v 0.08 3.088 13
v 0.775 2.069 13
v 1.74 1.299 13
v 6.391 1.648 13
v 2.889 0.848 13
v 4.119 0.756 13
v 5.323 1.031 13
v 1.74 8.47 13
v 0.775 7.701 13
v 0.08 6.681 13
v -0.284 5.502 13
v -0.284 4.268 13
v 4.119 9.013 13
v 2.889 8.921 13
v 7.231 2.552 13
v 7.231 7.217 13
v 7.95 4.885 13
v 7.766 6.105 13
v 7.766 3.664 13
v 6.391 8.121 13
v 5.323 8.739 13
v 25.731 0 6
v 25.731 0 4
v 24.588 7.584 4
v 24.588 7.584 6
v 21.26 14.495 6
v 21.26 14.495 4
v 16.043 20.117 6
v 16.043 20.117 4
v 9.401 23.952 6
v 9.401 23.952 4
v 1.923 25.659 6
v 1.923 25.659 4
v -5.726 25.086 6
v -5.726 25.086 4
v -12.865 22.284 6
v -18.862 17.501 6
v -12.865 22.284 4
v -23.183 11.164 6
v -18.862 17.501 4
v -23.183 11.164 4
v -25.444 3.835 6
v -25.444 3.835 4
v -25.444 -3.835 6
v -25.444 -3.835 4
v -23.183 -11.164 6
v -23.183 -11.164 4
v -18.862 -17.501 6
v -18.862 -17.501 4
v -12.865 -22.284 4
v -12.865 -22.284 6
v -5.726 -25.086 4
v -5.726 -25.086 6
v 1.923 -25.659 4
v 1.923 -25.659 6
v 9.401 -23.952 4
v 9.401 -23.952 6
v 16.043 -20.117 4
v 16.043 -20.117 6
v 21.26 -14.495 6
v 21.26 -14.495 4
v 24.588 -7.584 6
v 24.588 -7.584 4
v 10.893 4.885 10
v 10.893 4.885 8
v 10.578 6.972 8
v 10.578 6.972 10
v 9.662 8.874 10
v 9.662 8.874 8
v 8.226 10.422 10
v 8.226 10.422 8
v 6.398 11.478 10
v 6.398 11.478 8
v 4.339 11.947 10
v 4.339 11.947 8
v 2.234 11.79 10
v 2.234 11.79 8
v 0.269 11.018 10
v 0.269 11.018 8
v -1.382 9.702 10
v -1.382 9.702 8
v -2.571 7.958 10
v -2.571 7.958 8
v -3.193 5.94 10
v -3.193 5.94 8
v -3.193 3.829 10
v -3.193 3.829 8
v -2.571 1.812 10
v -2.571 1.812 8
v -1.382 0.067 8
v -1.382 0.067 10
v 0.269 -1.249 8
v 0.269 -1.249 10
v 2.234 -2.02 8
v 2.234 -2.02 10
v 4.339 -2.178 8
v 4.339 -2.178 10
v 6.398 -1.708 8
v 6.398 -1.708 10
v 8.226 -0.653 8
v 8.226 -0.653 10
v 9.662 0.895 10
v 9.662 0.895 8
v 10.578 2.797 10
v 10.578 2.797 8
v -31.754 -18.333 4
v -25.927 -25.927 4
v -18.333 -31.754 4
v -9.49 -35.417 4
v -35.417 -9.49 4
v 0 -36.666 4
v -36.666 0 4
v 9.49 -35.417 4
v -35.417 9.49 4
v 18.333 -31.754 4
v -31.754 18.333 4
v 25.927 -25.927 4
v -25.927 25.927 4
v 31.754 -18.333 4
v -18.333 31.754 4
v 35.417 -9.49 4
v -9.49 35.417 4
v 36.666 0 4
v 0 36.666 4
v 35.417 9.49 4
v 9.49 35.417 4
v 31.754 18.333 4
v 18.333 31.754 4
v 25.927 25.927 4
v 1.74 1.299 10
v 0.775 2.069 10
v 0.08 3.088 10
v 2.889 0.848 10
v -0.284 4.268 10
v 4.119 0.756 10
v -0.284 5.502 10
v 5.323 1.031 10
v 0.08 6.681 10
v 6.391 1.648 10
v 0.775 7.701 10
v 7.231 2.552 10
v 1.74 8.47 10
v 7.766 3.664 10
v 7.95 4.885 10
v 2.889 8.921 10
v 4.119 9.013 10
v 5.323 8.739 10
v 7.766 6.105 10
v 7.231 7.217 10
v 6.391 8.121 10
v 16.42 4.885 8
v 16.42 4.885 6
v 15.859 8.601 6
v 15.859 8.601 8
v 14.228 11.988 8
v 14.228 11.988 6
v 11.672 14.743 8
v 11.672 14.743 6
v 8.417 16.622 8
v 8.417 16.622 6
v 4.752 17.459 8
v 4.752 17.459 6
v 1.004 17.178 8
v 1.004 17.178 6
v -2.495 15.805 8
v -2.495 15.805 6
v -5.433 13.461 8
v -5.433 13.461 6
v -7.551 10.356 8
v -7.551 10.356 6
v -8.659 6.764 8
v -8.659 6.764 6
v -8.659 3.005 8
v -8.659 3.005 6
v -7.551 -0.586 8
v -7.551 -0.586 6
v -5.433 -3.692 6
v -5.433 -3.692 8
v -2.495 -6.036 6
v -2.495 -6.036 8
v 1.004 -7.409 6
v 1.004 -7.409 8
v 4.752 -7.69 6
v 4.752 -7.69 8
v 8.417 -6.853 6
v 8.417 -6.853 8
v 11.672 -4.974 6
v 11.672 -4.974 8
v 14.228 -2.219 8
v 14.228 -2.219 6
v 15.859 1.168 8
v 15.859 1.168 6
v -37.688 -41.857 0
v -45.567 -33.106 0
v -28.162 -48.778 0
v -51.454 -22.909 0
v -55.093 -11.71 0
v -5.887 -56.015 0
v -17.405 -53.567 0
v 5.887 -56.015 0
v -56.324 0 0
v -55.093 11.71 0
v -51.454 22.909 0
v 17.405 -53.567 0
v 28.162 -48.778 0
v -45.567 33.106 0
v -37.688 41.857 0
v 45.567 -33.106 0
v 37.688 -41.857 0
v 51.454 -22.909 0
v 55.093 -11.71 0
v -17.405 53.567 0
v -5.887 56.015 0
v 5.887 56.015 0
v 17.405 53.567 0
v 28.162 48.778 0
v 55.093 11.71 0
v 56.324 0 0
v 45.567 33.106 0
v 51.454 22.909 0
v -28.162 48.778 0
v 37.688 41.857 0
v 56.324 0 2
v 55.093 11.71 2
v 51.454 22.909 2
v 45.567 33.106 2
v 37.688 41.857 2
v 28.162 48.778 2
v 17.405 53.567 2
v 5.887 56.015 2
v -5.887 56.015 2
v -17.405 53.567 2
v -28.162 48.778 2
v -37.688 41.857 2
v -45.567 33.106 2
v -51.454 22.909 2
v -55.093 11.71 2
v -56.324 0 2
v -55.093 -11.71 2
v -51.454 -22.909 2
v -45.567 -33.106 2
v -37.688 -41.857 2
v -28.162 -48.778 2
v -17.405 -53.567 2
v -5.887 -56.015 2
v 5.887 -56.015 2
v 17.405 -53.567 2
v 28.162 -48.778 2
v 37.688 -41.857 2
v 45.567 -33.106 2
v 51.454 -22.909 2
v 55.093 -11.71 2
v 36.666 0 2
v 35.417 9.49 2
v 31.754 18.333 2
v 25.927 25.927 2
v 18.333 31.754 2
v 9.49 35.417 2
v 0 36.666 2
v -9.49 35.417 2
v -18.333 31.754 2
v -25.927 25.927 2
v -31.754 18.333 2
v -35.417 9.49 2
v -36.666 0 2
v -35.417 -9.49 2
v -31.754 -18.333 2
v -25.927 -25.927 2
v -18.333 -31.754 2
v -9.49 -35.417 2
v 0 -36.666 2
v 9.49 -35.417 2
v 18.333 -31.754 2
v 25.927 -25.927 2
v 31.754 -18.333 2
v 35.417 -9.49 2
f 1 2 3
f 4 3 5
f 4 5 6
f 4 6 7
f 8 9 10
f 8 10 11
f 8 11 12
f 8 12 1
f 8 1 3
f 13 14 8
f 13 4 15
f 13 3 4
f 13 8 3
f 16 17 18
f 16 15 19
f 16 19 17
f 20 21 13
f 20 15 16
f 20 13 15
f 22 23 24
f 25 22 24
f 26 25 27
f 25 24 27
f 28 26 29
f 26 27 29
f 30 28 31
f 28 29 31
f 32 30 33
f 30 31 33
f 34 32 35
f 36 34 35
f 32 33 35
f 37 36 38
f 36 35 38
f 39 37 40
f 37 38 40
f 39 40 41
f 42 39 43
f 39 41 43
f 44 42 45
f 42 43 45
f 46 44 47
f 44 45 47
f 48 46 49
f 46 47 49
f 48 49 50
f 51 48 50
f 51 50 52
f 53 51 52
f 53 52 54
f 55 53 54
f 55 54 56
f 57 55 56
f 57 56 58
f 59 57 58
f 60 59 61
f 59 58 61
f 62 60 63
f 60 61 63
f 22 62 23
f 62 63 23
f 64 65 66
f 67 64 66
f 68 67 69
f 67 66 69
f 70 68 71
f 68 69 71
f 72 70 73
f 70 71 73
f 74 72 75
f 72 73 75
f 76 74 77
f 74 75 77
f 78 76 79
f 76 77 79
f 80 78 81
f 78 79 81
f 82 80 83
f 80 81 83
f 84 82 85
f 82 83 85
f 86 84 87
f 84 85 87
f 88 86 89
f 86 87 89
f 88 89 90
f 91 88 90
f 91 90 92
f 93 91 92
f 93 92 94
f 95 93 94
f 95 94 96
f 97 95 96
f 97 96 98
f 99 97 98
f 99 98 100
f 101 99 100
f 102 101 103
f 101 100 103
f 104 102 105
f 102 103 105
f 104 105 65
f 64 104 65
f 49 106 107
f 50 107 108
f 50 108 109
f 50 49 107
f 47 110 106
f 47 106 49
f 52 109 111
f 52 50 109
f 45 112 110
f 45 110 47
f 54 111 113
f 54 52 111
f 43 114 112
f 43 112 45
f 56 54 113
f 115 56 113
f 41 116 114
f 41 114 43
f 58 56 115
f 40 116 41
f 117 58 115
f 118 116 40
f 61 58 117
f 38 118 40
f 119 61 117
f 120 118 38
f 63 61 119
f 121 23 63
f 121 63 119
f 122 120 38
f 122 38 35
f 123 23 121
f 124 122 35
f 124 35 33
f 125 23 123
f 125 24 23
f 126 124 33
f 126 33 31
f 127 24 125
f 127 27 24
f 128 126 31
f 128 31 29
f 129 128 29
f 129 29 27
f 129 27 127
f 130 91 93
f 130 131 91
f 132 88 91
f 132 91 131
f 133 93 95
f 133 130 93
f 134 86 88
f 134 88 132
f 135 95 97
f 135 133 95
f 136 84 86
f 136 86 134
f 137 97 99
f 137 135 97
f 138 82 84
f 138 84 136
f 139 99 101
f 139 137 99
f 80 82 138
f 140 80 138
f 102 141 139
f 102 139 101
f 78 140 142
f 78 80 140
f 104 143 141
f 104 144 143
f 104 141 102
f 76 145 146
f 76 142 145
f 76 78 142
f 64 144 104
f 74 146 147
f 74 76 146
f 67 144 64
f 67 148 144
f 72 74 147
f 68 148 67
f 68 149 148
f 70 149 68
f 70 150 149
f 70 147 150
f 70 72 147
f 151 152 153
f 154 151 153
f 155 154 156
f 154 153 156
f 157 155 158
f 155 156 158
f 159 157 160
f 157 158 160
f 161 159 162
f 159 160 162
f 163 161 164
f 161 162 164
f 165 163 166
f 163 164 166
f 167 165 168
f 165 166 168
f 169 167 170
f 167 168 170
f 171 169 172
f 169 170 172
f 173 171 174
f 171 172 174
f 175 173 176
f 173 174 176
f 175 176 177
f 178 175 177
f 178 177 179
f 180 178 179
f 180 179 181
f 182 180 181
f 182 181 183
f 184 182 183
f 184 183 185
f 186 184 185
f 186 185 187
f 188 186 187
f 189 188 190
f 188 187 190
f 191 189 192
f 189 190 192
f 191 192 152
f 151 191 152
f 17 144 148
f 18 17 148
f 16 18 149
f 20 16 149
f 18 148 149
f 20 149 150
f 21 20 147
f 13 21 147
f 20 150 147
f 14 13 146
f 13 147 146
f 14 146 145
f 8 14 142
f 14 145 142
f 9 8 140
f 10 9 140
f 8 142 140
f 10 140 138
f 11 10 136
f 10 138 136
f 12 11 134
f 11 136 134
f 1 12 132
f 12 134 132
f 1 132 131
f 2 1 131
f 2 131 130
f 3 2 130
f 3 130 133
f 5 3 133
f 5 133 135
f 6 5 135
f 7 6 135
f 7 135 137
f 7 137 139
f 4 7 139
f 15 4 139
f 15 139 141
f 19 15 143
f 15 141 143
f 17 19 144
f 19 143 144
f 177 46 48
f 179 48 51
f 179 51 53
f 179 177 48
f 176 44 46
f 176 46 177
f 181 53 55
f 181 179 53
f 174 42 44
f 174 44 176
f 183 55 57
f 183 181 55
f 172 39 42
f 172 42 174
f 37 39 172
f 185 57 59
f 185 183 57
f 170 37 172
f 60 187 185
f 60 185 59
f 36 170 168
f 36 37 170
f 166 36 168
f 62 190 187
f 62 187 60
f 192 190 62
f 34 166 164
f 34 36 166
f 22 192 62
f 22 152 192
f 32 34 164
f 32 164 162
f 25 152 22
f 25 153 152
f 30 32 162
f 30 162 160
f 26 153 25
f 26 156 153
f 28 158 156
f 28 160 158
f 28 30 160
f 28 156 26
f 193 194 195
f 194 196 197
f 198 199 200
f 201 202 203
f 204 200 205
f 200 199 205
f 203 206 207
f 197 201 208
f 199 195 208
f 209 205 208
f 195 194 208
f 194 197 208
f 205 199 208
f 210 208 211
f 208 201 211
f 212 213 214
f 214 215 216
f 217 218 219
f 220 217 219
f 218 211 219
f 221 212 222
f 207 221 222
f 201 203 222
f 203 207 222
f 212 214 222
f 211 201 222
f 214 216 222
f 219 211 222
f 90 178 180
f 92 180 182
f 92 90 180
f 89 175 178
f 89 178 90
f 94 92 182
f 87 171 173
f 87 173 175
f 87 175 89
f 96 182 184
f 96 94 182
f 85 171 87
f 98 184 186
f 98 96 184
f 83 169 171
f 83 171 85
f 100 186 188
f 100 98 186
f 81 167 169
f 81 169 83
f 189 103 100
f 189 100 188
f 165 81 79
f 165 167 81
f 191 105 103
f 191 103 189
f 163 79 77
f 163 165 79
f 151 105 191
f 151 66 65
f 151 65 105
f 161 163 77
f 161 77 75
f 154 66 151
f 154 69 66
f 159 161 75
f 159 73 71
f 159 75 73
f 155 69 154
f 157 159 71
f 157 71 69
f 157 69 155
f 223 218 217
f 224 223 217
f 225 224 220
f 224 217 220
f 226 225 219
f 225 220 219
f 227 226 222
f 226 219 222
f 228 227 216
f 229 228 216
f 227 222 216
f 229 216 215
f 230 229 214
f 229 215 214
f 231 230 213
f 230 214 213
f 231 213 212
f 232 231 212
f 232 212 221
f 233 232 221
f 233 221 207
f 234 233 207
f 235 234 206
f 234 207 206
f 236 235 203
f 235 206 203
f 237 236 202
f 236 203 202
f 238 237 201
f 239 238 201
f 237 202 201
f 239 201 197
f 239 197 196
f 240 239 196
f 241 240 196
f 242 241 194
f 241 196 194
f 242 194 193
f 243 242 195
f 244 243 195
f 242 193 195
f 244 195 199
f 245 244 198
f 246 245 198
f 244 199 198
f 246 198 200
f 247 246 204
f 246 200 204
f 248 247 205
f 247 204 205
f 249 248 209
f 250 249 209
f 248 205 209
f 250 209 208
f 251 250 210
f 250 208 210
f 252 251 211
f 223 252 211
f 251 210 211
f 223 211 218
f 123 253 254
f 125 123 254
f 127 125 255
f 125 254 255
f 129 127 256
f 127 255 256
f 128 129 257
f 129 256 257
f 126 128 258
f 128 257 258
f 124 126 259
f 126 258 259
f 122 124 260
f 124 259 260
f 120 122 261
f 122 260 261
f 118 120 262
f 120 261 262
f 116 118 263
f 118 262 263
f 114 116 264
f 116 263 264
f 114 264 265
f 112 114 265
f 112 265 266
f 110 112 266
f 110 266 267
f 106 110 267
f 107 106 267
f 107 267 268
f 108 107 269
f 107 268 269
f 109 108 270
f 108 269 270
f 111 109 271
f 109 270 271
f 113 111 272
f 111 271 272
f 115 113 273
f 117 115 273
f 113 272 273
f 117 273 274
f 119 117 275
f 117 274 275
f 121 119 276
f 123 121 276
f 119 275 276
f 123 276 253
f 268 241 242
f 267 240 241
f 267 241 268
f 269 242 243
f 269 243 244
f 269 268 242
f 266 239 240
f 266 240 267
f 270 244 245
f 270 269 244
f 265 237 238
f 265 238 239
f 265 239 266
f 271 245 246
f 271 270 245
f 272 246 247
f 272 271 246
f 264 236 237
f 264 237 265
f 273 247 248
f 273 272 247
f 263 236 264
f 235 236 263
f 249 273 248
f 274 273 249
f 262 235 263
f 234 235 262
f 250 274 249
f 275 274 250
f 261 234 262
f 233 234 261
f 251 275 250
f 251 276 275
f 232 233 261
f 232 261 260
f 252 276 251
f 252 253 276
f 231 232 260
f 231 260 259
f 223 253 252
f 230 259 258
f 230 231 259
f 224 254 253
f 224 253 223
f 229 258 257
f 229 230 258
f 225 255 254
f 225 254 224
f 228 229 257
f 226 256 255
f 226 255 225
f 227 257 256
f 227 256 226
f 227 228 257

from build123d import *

# Parameters (mm, degrees)
F0_R      = 56.323748
F1_DEPTH  = 2
F2_R      = 36.666383
F3_DEPTH  = 2
F4_R      = 25.730938
F5_DEPTH  = 2
F6_R      = 12.6095
F7_DEPTH  = 2
F8_R      = 7.082523
F9_DEPTH  = 2
F10_R     = 4.140126
F11_DEPTH = 3


with BuildPart() as f1:
    # F0 (on Top) → F1 (new body)
    with BuildSketch(Plane.XY):
        Circle(F0_R)
    extrude(amount=F1_DEPTH)

    # F2 (on face) → F3 (join)
    with BuildSketch(Plane.XY.offset(2)):
        Circle(F2_R)
    extrude(amount=F3_DEPTH)

    # F4 (on face) → F5 (join)
    with BuildSketch(Plane.XY.offset(4)):
        Circle(F4_R)
    extrude(amount=F5_DEPTH)

    # F6 (on face) → F7 (join)
    with BuildSketch(Plane.XY.offset(6)):
        with Locations((3.81, 4.884616)):
            Circle(F6_R)
    extrude(amount=F7_DEPTH)

    # F8 (on face) → F9 (join)
    with BuildSketch(Plane.XY.offset(8)):
        with Locations((3.81, 4.884616)):
            Circle(F8_R)
    extrude(amount=F9_DEPTH)

    # F10 (on face) → F11 (join)
    with BuildSketch(Plane.XY.offset(10)):
        with Locations((3.81, 4.884616)):
            Circle(F10_R)
    extrude(amount=F11_DEPTH)


solid = f1.part
